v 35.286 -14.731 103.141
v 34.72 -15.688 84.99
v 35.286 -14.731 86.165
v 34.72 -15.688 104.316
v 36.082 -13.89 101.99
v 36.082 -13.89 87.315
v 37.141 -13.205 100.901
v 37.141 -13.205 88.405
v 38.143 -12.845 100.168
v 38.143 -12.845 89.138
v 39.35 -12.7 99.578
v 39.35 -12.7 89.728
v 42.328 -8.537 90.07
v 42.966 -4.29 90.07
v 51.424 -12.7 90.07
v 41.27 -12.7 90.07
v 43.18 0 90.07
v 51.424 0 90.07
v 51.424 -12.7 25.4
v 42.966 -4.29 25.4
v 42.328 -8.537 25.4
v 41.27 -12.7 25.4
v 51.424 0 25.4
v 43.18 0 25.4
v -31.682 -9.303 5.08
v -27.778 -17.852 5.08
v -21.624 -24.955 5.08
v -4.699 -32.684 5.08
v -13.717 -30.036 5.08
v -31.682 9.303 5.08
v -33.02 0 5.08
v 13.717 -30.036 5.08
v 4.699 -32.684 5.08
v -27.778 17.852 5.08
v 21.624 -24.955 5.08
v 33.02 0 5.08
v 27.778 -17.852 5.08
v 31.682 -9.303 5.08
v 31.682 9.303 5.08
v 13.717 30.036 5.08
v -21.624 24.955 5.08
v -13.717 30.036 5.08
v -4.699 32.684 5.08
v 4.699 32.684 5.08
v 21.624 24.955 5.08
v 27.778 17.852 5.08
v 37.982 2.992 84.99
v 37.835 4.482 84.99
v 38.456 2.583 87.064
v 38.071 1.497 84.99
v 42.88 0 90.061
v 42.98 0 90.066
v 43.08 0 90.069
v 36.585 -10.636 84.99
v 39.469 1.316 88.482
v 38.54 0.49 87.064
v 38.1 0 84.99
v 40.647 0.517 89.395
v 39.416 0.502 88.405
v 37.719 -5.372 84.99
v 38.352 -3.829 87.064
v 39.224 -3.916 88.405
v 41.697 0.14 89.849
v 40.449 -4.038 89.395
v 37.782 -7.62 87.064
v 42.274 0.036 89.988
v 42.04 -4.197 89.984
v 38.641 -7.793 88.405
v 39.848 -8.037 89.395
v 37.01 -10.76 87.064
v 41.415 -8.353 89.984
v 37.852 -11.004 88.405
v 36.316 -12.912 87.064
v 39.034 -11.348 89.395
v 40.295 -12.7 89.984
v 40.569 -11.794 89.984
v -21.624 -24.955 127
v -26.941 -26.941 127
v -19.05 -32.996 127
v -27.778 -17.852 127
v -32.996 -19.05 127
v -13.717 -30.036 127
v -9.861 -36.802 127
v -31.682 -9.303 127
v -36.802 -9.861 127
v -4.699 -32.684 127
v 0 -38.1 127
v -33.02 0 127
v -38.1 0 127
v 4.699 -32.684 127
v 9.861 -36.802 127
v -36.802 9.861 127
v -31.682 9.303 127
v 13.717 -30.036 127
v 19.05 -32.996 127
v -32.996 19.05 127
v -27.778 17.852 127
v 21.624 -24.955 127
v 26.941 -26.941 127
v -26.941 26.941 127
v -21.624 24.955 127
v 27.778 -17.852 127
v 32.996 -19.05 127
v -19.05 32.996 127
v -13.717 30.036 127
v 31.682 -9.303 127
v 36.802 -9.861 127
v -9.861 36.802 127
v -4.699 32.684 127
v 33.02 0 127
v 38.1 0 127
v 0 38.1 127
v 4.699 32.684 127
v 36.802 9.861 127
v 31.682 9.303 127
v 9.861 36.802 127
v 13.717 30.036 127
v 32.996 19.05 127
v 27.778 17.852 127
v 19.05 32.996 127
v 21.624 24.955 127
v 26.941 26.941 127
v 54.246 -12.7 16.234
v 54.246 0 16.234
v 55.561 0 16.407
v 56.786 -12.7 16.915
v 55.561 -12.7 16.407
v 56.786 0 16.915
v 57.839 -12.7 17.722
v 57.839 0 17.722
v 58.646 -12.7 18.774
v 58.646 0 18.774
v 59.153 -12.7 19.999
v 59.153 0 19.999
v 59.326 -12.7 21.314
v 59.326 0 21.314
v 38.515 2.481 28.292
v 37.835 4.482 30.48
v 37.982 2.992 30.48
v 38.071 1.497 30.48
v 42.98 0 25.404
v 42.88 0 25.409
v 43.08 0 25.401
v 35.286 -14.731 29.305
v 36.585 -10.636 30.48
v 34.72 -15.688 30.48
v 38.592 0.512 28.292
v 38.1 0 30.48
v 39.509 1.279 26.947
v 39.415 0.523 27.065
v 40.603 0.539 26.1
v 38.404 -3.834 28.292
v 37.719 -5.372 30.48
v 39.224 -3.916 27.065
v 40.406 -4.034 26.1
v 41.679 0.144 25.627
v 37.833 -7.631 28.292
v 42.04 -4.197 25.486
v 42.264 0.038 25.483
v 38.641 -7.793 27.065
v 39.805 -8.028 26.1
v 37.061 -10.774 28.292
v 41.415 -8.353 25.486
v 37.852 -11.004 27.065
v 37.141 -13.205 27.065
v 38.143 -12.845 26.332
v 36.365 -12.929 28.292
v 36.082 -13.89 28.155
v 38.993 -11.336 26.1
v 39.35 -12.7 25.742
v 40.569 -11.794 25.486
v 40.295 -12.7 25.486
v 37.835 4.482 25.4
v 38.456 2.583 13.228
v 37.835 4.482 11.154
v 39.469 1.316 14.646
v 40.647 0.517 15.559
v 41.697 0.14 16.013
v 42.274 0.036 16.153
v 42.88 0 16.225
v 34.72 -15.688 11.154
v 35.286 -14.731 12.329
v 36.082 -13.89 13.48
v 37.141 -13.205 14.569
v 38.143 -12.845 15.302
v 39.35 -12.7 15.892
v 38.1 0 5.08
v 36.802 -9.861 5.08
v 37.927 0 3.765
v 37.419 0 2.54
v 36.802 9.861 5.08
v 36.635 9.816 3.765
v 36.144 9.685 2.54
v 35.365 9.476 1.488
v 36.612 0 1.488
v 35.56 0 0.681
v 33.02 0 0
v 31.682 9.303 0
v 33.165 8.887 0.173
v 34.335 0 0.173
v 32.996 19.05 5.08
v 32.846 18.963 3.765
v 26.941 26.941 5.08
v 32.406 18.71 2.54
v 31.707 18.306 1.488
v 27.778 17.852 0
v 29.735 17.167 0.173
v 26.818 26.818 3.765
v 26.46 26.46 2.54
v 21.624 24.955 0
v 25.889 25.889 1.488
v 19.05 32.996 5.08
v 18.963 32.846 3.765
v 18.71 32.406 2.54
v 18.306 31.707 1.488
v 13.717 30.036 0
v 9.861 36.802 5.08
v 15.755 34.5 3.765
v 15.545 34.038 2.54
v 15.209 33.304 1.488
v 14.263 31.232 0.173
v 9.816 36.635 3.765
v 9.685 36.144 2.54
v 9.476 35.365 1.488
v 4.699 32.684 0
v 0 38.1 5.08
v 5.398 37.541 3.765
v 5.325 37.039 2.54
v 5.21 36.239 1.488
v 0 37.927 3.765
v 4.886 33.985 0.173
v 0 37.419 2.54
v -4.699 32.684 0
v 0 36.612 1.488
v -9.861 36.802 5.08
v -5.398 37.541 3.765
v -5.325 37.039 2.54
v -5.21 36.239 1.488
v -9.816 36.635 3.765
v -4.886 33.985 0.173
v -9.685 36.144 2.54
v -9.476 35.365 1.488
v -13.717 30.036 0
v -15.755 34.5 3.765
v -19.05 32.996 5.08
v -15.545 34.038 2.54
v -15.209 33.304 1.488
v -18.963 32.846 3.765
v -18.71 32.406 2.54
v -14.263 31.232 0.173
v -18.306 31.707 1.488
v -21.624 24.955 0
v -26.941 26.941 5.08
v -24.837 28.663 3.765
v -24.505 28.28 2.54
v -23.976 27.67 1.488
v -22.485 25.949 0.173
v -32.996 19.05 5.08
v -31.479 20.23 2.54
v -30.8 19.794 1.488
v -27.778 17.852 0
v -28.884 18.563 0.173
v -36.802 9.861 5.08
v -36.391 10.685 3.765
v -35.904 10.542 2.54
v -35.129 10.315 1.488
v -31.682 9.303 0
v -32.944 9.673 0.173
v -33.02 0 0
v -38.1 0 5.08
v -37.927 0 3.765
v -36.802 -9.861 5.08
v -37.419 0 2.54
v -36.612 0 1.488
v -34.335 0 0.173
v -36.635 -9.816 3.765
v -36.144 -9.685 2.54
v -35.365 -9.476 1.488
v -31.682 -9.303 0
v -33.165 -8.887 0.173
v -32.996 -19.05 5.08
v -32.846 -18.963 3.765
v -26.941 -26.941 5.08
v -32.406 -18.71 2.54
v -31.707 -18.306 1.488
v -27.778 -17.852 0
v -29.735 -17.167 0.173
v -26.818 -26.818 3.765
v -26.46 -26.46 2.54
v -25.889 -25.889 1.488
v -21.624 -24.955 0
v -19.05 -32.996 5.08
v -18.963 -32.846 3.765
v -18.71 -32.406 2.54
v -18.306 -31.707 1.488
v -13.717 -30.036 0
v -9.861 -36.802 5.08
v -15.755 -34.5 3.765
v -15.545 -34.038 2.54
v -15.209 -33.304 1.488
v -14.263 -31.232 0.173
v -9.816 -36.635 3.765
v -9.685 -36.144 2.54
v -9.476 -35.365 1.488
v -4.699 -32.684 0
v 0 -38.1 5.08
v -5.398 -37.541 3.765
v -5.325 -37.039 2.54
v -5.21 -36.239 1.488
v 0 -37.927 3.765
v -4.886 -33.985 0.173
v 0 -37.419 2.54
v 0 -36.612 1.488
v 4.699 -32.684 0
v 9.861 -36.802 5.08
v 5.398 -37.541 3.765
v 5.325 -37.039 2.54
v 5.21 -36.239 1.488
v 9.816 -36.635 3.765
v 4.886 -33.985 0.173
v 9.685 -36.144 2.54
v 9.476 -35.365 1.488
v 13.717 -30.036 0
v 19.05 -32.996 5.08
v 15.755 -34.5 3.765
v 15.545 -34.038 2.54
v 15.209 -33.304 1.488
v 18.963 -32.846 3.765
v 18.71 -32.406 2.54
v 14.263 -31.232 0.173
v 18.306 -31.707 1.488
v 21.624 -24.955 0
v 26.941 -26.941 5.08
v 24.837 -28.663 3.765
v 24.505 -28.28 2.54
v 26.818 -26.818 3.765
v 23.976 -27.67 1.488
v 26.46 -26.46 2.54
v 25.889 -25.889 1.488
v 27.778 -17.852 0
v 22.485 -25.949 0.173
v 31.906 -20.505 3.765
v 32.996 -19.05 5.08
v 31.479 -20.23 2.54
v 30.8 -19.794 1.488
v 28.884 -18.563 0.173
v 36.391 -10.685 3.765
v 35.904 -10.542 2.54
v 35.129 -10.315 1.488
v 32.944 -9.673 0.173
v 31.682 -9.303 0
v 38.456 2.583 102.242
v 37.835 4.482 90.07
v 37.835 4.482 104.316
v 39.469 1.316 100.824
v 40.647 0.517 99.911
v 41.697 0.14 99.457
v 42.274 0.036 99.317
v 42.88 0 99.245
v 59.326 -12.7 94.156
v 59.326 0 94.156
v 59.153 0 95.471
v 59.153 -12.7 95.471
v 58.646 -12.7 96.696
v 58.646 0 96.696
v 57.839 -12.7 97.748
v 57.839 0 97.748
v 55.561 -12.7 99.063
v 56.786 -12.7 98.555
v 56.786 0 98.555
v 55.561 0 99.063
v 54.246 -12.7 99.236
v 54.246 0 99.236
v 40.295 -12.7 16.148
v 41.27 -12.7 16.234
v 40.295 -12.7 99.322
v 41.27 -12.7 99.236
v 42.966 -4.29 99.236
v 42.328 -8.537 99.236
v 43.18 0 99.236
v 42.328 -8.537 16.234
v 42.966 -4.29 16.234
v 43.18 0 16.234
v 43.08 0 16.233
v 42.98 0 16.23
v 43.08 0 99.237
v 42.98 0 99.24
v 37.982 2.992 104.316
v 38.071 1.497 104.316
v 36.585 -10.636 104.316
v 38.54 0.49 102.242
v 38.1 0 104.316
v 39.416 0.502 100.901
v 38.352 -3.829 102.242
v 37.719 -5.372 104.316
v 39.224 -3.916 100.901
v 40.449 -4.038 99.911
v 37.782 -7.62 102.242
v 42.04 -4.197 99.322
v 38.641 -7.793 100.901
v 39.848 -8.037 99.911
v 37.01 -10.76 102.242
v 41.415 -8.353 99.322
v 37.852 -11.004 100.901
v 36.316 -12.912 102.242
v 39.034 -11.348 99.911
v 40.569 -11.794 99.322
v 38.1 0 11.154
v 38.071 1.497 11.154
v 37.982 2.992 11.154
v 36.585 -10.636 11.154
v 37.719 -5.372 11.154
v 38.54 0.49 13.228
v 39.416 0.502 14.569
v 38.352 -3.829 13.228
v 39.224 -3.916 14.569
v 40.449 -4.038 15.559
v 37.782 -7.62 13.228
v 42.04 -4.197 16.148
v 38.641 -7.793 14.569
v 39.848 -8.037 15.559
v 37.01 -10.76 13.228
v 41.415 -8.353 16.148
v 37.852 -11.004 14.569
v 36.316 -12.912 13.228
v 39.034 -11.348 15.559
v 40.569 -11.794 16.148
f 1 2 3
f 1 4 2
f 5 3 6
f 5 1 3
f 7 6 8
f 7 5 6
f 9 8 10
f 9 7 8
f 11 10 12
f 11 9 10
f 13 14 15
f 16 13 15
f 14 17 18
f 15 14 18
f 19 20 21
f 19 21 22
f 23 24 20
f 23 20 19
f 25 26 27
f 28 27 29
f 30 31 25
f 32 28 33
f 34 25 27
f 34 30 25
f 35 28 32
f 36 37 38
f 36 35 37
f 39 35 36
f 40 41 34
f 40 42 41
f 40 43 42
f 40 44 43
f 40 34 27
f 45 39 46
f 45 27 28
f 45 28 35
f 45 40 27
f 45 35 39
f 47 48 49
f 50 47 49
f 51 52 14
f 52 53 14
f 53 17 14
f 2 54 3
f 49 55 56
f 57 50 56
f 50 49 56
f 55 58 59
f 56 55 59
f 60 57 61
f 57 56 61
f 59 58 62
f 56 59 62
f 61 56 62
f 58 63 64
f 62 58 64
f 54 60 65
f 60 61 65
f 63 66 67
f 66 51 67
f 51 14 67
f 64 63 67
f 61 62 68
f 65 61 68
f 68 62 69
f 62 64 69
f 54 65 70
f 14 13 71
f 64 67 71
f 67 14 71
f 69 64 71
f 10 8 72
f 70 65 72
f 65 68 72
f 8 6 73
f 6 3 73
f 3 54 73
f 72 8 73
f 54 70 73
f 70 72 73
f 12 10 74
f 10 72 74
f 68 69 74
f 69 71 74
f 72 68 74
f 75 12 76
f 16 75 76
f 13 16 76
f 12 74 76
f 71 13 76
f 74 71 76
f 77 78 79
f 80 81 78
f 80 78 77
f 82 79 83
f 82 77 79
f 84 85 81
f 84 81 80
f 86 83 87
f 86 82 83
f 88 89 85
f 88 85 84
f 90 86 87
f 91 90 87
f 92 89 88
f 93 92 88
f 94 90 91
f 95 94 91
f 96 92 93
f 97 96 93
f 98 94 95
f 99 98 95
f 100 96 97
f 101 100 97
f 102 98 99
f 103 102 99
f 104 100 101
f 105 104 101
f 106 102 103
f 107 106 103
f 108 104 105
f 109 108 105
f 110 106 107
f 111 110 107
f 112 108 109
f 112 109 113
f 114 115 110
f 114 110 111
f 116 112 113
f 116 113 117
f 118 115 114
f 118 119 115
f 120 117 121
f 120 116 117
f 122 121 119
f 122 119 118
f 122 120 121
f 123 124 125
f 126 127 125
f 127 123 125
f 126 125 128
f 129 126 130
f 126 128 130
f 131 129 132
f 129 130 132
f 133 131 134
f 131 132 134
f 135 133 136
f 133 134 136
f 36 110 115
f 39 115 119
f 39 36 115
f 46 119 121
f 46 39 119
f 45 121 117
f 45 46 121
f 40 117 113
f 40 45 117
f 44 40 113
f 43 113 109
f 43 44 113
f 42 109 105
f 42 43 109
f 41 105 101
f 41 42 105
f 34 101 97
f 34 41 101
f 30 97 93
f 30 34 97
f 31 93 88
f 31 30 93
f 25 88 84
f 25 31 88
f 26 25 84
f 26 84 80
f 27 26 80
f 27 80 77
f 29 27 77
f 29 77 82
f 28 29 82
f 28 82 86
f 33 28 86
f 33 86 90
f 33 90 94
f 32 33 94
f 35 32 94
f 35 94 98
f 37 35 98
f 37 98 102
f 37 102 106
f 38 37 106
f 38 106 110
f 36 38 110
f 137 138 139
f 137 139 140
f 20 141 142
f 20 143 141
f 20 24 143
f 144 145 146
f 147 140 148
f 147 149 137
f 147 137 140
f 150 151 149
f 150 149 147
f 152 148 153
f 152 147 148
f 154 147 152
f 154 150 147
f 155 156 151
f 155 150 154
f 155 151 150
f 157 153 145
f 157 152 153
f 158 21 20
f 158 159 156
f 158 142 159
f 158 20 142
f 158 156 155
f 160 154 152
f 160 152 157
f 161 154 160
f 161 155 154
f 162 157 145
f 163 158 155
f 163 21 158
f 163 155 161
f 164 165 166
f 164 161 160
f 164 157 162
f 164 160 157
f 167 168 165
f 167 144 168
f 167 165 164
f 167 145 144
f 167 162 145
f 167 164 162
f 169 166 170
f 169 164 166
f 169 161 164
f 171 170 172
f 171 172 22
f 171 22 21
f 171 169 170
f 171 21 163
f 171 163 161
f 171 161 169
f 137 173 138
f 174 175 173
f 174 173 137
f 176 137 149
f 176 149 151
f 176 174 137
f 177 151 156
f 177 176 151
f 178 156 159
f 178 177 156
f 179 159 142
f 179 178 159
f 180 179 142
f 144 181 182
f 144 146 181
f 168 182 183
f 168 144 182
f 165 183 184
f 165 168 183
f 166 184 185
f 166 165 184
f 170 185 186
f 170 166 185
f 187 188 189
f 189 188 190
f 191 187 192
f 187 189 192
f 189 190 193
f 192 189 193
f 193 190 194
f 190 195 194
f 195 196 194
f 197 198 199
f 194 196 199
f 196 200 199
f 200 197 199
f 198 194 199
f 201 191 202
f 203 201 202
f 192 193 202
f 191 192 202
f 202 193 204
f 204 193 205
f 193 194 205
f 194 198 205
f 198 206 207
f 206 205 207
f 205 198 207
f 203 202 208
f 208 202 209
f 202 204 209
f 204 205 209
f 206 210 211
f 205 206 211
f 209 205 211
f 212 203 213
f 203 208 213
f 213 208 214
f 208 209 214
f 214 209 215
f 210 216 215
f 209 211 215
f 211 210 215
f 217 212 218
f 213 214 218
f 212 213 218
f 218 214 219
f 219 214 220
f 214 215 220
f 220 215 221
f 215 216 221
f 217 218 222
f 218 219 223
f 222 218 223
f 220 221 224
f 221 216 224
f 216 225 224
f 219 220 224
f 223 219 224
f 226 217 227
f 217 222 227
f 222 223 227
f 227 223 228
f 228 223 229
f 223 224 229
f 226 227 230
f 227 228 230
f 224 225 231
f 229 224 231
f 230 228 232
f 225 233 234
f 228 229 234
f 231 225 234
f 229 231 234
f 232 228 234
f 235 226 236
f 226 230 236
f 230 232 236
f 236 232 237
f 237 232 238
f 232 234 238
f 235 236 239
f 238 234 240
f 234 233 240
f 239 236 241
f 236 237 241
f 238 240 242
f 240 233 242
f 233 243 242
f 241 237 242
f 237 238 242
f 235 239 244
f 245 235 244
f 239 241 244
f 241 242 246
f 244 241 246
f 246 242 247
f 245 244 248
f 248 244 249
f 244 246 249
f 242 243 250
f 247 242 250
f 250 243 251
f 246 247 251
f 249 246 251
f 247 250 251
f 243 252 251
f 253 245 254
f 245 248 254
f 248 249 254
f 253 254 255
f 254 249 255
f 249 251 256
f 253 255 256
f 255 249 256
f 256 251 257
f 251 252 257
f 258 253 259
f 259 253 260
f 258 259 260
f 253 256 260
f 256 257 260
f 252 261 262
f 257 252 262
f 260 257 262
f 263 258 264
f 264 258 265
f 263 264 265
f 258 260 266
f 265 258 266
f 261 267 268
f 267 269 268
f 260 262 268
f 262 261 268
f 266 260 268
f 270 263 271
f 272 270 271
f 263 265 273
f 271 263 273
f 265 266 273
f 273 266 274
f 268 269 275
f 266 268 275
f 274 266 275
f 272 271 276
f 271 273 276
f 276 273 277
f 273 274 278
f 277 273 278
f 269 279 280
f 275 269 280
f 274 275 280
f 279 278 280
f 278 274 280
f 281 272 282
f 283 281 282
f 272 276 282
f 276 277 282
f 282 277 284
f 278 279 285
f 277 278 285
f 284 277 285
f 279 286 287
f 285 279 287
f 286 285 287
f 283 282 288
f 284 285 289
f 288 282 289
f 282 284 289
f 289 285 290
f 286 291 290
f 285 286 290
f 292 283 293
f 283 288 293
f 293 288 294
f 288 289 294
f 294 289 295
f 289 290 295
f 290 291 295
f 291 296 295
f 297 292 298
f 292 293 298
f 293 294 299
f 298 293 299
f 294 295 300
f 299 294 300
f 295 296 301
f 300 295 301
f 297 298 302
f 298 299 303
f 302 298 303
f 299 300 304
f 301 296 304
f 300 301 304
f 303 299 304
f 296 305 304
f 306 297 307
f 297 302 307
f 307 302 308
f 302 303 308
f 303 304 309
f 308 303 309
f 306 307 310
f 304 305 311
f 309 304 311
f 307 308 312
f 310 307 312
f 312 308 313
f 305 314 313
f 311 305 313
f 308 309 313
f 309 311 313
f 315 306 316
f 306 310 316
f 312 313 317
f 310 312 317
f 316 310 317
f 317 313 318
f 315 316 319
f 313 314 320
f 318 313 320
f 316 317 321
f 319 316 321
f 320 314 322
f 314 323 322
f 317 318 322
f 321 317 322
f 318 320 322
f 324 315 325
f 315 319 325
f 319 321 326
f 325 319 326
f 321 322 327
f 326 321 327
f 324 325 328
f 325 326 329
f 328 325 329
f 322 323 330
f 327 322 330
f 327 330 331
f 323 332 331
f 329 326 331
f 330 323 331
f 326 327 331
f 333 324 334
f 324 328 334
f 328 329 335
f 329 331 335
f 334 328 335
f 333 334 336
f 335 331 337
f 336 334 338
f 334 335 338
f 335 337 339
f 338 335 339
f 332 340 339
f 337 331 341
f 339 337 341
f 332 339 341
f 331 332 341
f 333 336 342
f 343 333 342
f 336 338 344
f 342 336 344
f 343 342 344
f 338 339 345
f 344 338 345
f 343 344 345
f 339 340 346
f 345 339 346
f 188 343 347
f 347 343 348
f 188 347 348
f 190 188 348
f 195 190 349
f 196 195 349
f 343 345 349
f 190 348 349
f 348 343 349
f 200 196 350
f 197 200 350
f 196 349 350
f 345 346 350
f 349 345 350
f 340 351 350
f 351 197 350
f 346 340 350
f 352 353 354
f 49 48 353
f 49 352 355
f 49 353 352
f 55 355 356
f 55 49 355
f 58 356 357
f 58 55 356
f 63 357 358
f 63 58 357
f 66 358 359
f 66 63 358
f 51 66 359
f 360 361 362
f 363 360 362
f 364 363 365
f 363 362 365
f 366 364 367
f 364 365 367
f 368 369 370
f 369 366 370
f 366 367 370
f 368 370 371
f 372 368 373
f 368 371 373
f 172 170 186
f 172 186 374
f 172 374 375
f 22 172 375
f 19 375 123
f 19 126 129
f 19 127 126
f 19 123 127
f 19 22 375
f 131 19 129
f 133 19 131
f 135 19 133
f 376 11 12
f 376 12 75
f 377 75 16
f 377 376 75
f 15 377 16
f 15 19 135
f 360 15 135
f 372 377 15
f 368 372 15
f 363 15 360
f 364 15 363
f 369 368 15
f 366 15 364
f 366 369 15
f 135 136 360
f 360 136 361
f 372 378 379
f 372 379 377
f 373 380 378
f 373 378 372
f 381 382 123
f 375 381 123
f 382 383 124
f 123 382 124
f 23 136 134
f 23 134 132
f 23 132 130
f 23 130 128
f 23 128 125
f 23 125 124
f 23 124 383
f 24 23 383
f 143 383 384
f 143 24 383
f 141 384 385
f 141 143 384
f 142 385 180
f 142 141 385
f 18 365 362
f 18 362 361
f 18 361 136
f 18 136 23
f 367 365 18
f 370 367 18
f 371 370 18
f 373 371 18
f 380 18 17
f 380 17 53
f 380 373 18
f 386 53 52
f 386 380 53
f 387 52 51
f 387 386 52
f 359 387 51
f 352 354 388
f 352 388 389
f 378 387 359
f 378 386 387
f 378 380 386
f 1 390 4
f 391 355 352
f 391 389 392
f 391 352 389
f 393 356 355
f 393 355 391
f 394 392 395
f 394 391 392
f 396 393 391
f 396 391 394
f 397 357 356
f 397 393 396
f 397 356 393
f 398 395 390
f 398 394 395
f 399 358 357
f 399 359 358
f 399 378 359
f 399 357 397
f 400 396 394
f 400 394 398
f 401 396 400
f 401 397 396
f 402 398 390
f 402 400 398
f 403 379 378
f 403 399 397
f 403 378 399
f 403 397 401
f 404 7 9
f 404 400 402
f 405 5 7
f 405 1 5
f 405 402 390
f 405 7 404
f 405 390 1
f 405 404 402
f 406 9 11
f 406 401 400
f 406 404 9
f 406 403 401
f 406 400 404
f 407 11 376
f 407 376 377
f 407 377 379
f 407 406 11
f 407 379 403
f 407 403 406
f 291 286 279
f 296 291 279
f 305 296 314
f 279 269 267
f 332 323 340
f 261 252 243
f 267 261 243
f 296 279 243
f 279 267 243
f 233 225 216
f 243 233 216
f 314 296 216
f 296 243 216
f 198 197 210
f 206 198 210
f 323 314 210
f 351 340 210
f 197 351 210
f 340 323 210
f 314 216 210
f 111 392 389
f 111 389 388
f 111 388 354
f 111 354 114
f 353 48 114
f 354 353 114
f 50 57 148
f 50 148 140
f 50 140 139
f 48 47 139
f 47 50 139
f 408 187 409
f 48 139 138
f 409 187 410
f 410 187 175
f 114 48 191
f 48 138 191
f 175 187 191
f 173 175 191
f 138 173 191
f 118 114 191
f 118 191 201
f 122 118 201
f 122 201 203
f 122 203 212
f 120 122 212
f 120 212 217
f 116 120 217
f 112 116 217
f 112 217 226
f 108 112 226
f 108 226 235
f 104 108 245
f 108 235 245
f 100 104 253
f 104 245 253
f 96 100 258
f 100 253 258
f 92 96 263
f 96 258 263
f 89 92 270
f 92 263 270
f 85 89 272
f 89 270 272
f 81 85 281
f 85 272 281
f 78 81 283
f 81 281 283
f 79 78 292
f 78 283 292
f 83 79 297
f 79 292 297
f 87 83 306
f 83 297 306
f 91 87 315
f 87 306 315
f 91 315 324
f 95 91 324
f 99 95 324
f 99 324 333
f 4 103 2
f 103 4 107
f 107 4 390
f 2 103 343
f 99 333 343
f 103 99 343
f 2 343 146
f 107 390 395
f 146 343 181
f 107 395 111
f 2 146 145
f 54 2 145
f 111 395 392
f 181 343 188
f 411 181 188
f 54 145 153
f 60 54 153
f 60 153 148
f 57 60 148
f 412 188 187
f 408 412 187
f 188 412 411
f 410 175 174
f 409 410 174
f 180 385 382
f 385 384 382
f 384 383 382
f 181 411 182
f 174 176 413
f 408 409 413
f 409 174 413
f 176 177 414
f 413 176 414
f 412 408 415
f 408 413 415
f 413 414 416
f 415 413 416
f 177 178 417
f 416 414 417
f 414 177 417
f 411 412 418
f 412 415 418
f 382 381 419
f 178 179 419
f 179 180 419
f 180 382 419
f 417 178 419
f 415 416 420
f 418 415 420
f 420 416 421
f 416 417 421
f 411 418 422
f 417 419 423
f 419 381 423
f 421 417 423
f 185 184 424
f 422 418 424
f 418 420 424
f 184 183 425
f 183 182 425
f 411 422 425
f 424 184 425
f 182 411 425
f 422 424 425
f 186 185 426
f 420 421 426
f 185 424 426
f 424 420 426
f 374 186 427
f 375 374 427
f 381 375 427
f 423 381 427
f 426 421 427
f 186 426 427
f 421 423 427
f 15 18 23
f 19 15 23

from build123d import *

# Parameters (mm, degrees)
F0_R          = 38.1
F1_DEPTH      = 127
F2_T          = -5.08
F4_DEPTH      = 12.7
F5_T1_DEPTH   = 9.165816009
F5_T3_DEPTH   = 9.165816009
F5_T8_ANGLE   = 38.5701728076
F5_T13_ANGLE  = 38.5701728076
F5_T18_ANGLE  = 38.5701728076
F5_T23_ANGLE  = 38.5701728076
F5_T29_DEPTH  = 17.737031792
F5_T33_ANGLE  = 38.5701728076
F5_T40_ANGLE  = 38.5701728076
F5_T44_DEPTH  = 17.737031792
F5_T51_DEPTH  = 17.737031792
F5_T55_ANGLE  = 38.5701728076
F5_T62_ANGLE  = 38.5701728076
F5_T66_DEPTH  = 17.737031792
F5_T73_ANGLE  = 57.6691249807
F5_T77_DEPTH  = 21.1161541615
F5_T84_ANGLE  = 57.6691249807
F5_T88_DEPTH  = 21.1161541615
F5_T95_ANGLE  = 57.6691249807
F5_T99_DEPTH  = 21.1161541615
F5_T106_ANGLE = 57.6691249807
F5_T110_DEPTH = 21.1161541615
F5_T113_DEPTH = 38.1


# Not quite as in the source:
# - a fillet or chamfer that OpenCascade refuses, or shapes differently, is made with other operations: its cross-section is extruded or revolved along the edge and cut away or added


with BuildPart() as f1:
    # F0 (on Top) → F1 (new body)
    with BuildSketch(Plane.XY):
        Circle(F0_R)
    extrude(amount=F1_DEPTH)

    # F2
    f2_openings = [f1.faces().sort_by_distance(p)[0] for p in [
        (0, 0, 127),
    ]]
    offset(amount=F2_T, openings=f2_openings)

    # F3 (on Front) → F4 (join)
    with BuildSketch(Plane.XZ):
        Polygon((59.3263991177, 99.2357954383), (35.6448739767, 99.2357954383), (35.6448739767, 90.0699794292), (51.4244176447, 90.0699794292), (51.4244176447, 25.3999941051), (35.6448739767, 25.3999941051), (35.6448739767, 16.2341780961), (59.3263991177, 16.2341780961), align=None)
    extrude(amount=F4_DEPTH)

    # F5: fillet of radius 5.08 on 11 edges, made by hand

    # F5_s2 → F5_t1 (join)
    with BuildSketch(Plane.XY.offset(16.2341780961)):
        with BuildLine():
            ThreePointArc((34.720156586, -15.6882352941), (36.5944939832, -13.5119463039), (39.3495107975, -12.7))
            Line((39.3495107975, -12.7), (35.9210244843, -12.7))
            ThreePointArc((35.9210244843, -12.7), (35.3521781973, -14.2068116305), (34.720156586, -15.6882352941))
        make_face()
        with BuildLine():
            ThreePointArc((37.8354134656, 4.4823529412), (39.5059425471, 1.2824713919), (42.880135261, 0))
            Line((42.880135261, 0), (38.1, 0))
            ThreePointArc((38.1, 0), (38.0337958468, 2.2450776113), (37.8354134656, 4.4823529412))
        make_face()
    extrude(amount=F5_T1_DEPTH)

    # F5_s4 → F5_t3 (join)
    with BuildSketch(Plane.XY.offset(90.0699794292)):
        with BuildLine():
            ThreePointArc((34.720156586, -15.6882352941), (36.5944939832, -13.5119463039), (39.3495107975, -12.7))
            Line((39.3495107975, -12.7), (35.9210244843, -12.7))
            ThreePointArc((35.9210244843, -12.7), (35.3521781973, -14.2068116305), (34.720156586, -15.6882352941))
        make_face()
        with BuildLine():
            ThreePointArc((37.8354134656, 4.4823529412), (39.5059425471, 1.2824713919), (42.880135261, 0))
            Line((42.880135261, 0), (38.1, 0))
            ThreePointArc((38.1, 0), (38.0337958468, 2.2450776113), (37.8354134656, 4.4823529412))
        make_face()
    extrude(amount=F5_T3_DEPTH)


with BuildPart() as f5_tool6:
    # F5_s7 → F5_t8 (revolve)
    with BuildSketch(Plane.XZ):
        with BuildLine():
            ThreePointArc((38.1, 104.3157954383), (39.5878975516, 100.7236929899), (43.18, 99.2357954383))
            Line((43.18, 99.2357954383), (38.1, 99.2357954383))
            Line((38.1, 99.2357954383), (38.1, 104.3157954383))
        make_face()
    revolve(axis=Axis((0, 0, 99.2357954383), (0, 0, -1)), revolution_arc=F5_T8_ANGLE)

    split(bisect_by=Plane.XZ.offset(12.7), keep=Keep.BOTTOM)


with BuildPart() as f1_1:
    add(f1.part)

    # F5_t5: union F5_tool6
    add(f5_tool6.part)


with BuildPart() as f5_tool11:
    # F5_s12 → F5_t13 (revolve)
    with BuildSketch(Plane.XZ):
        with BuildLine():
            ThreePointArc((38.1, 84.9899794292), (39.5878975516, 88.5820818777), (43.18, 90.0699794292))
            Line((43.18, 90.0699794292), (38.1, 90.0699794292))
            Line((38.1, 90.0699794292), (38.1, 84.9899794292))
        make_face()
    revolve(axis=Axis((0, 0, 90.0699794292), (0, 0, -1)), revolution_arc=F5_T13_ANGLE)

    split(bisect_by=Plane.XZ.offset(12.7), keep=Keep.BOTTOM)


with BuildPart() as f1_2:
    add(f1_1.part)

    # F5_t10: union F5_tool11
    add(f5_tool11.part)


with BuildPart() as f5_tool16:
    # F5_s17 → F5_t18 (revolve)
    with BuildSketch(Plane.XZ):
        with BuildLine():
            ThreePointArc((38.1, 11.1541780961), (39.5878975516, 14.7462805445), (43.18, 16.2341780961))
            Line((43.18, 16.2341780961), (38.1, 16.2341780961))
            Line((38.1, 16.2341780961), (38.1, 11.1541780961))
        make_face()
    revolve(axis=Axis((0, 0, 16.2341780961), (0, 0, -1)), revolution_arc=F5_T18_ANGLE)

    split(bisect_by=Plane.XZ.offset(12.7), keep=Keep.BOTTOM)


with BuildPart() as f1_3:
    add(f1_2.part)

    # F5_t15: union F5_tool16
    add(f5_tool16.part)


with BuildPart() as f5_tool21:
    # F5_s22 → F5_t23 (revolve)
    with BuildSketch(Plane.XZ):
        with BuildLine():
            ThreePointArc((38.1, 30.4799941051), (39.5878975516, 26.8878916567), (43.18, 25.3999941051))
            Line((43.18, 25.3999941051), (38.1, 25.3999941051))
            Line((38.1, 25.3999941051), (38.1, 30.4799941051))
        make_face()
    revolve(axis=Axis((0, 0, 25.3999941051), (0, 0, -1)), revolution_arc=F5_T23_ANGLE)

    split(bisect_by=Plane.XZ.offset(12.7), keep=Keep.BOTTOM)


with BuildPart() as f1_4:
    add(f1_3.part)

    # F5_t20: union F5_tool21
    add(f5_tool21.part)


with BuildPart() as f5_tool27:
    # F5_s28 → F5_t29 (new body)
    with BuildSketch(Plane.XY.offset(33.9712098881)):
        with BuildLine():
            ThreePointArc((34.720156586, -15.6882352941), (36.5944939832, -13.5119463039), (39.3495107975, -12.7))
            Line((39.3495107975, -12.7), (35.9210244843, -12.7))
            ThreePointArc((35.9210244843, -12.7), (35.3521781973, -14.2068116305), (34.720156586, -15.6882352941))
        make_face()
    extrude(amount=-F5_T29_DEPTH)

    split(bisect_by=Plane.XY.offset(25.3999941051), keep=Keep.TOP)


with BuildPart() as f5_tool31:
    # F5_s32 → F5_t33 (revolve)
    with BuildSketch(Plane.XZ):
        with BuildLine():
            ThreePointArc((38.1, 30.4799941051), (39.5878975516, 26.8878916567), (43.18, 25.3999941051))
            Line((43.18, 25.3999941051), (38.1, 25.3999941051))
            Line((38.1, 25.3999941051), (38.1, 30.4799941051))
        make_face()
    revolve(axis=Axis((0, 0, 25.3999941051), (0, 0, -1)), revolution_arc=F5_T33_ANGLE)

    split(bisect_by=Plane.XZ.offset(12.7), keep=Keep.TOP)


with BuildPart() as f5_tool27_1:
    add(f5_tool27.part)

    # F5_t35: intersect F5_tool31
    add(f5_tool31.part, mode=Mode.INTERSECT)


with BuildPart() as f1_5:
    add(f1_4.part)

    # F5_t25: union F5_tool27
    add(f5_tool27_1.part)


with BuildPart() as f5_tool38:
    # F5_s39 → F5_t40 (revolve)
    with BuildSketch(Plane.XZ):
        with BuildLine():
            ThreePointArc((38.1, 11.1541780961), (39.5878975516, 14.7462805445), (43.18, 16.2341780961))
            Line((43.18, 16.2341780961), (38.1, 16.2341780961))
            Line((38.1, 16.2341780961), (38.1, 11.1541780961))
        make_face()
    revolve(axis=Axis((0, 0, 16.2341780961), (0, 0, -1)), revolution_arc=F5_T40_ANGLE)

    split(bisect_by=Plane.XZ.offset(12.7), keep=Keep.TOP)


with BuildPart() as f5_tool42:
    # F5_s43 → F5_t44 (new body)
    with BuildSketch(Plane.XY.offset(25.3999941051)):
        with BuildLine():
            ThreePointArc((34.720156586, -15.6882352941), (36.5944939832, -13.5119463039), (39.3495107975, -12.7))
            Line((39.3495107975, -12.7), (35.9210244843, -12.7))
            ThreePointArc((35.9210244843, -12.7), (35.3521781973, -14.2068116305), (34.720156586, -15.6882352941))
        make_face()
    extrude(amount=-F5_T44_DEPTH)

    split(bisect_by=Plane.XY.offset(16.2341780961), keep=Keep.BOTTOM)


with BuildPart() as f5_tool38_1:
    add(f5_tool38.part)

    # F5_t46: intersect F5_tool42
    add(f5_tool42.part, mode=Mode.INTERSECT)


with BuildPart() as f1_6:
    add(f1_5.part)

    # F5_t36: union F5_tool38
    add(f5_tool38_1.part)


with BuildPart() as f5_tool49:
    # F5_s50 → F5_t51 (new body)
    with BuildSketch(Plane.XY.offset(107.8070112213)):
        with BuildLine():
            ThreePointArc((34.720156586, -15.6882352941), (36.5944939832, -13.5119463039), (39.3495107975, -12.7))
            Line((39.3495107975, -12.7), (35.9210244843, -12.7))
            ThreePointArc((35.9210244843, -12.7), (35.3521781973, -14.2068116305), (34.720156586, -15.6882352941))
        make_face()
    extrude(amount=-F5_T51_DEPTH)

    split(bisect_by=Plane.XY.offset(99.2357954383), keep=Keep.TOP)


with BuildPart() as f5_tool53:
    # F5_s54 → F5_t55 (revolve)
    with BuildSketch(Plane.XZ):
        with BuildLine():
            ThreePointArc((38.1, 104.3157954383), (39.5878975516, 100.7236929899), (43.18, 99.2357954383))
            Line((43.18, 99.2357954383), (38.1, 99.2357954383))
            Line((38.1, 99.2357954383), (38.1, 104.3157954383))
        make_face()
    revolve(axis=Axis((0, 0, 99.2357954383), (0, 0, -1)), revolution_arc=F5_T55_ANGLE)

    split(bisect_by=Plane.XZ.offset(12.7), keep=Keep.TOP)


with BuildPart() as f5_tool49_1:
    add(f5_tool49.part)

    # F5_t57: intersect F5_tool53
    add(f5_tool53.part, mode=Mode.INTERSECT)


with BuildPart() as f1_7:
    add(f1_6.part)

    # F5_t47: union F5_tool49
    add(f5_tool49_1.part)


with BuildPart() as f5_tool60:
    # F5_s61 → F5_t62 (revolve)
    with BuildSketch(Plane.XZ):
        with BuildLine():
            ThreePointArc((38.1, 84.9899794292), (39.5878975516, 88.5820818777), (43.18, 90.0699794292))
            Line((43.18, 90.0699794292), (38.1, 90.0699794292))
            Line((38.1, 90.0699794292), (38.1, 84.9899794292))
        make_face()
    revolve(axis=Axis((0, 0, 90.0699794292), (0, 0, -1)), revolution_arc=F5_T62_ANGLE)

    split(bisect_by=Plane.XZ.offset(12.7), keep=Keep.TOP)


with BuildPart() as f5_tool64:
    # F5_s65 → F5_t66 (new body)
    with BuildSketch(Plane.XY.offset(99.2357954383)):
        with BuildLine():
            ThreePointArc((34.720156586, -15.6882352941), (36.5944939832, -13.5119463039), (39.3495107975, -12.7))
            Line((39.3495107975, -12.7), (35.9210244843, -12.7))
            ThreePointArc((35.9210244843, -12.7), (35.3521781973, -14.2068116305), (34.720156586, -15.6882352941))
        make_face()
    extrude(amount=-F5_T66_DEPTH)

    split(bisect_by=Plane.XY.offset(90.0699794292), keep=Keep.BOTTOM)


with BuildPart() as f5_tool60_1:
    add(f5_tool60.part)

    # F5_t68: intersect F5_tool64
    add(f5_tool64.part, mode=Mode.INTERSECT)


with BuildPart() as f1_8:
    add(f1_7.part)

    # F5_t58: union F5_tool60
    add(f5_tool60_1.part)


with BuildPart() as f5_tool71:
    # F5_s72 → F5_t73 (revolve)
    with BuildSketch(Plane(origin=(0, 0, 0), x_dir=(0, 0, 1), z_dir=(-0.3272006177, 0.9449548962, 0))):
        with BuildLine():
            ThreePointArc((104.3157954383, 38.1), (100.7236929899, 39.5878975516), (99.2357954383, 43.18))
            Line((99.2357954383, 43.18), (99.2357954383, 38.1))
            Line((99.2357954383, 38.1), (104.3157954383, 38.1))
        make_face()
    revolve(axis=Axis((0, 0, 99.2357954383), (0, 0, -1)), revolution_arc=F5_T73_ANGLE)

    split(bisect_by=Plane.XZ, keep=Keep.BOTTOM)


with BuildPart() as f5_tool75:
    # F5_s76 → F5_t77 (new body)
    with BuildSketch(Plane.XY.offset(90.0699794292)):
        with BuildLine():
            ThreePointArc((37.8354134656, 4.4823529412), (39.5059425471, 1.2824713919), (42.880135261, 0))
            Line((42.880135261, 0), (38.1, 0))
            ThreePointArc((38.1, 0), (38.0337958468, 2.2450776113), (37.8354134656, 4.4823529412))
        make_face()
    extrude(amount=F5_T77_DEPTH)

    split(bisect_by=Plane.XY.offset(99.2357954383), keep=Keep.TOP)


with BuildPart() as f5_tool71_1:
    add(f5_tool71.part)

    # F5_t79: intersect F5_tool75
    add(f5_tool75.part, mode=Mode.INTERSECT)


with BuildPart() as f1_9:
    add(f1_8.part)

    # F5_t69: union F5_tool71
    add(f5_tool71_1.part)


with BuildPart() as f5_tool82:
    # F5_s83 → F5_t84 (revolve)
    with BuildSketch(Plane(origin=(0, 0, 0), x_dir=(0, 0, 1), z_dir=(-0.3272006177, 0.9449548962, 0))):
        with BuildLine():
            ThreePointArc((84.9899794292, 38.1), (88.5820818777, 39.5878975516), (90.0699794292, 43.18))
            Line((90.0699794292, 43.18), (90.0699794292, 38.1))
            Line((90.0699794292, 38.1), (84.9899794292, 38.1))
        make_face()
    revolve(axis=Axis((0, 0, 90.0699794292), (0, 0, -1)), revolution_arc=F5_T84_ANGLE)

    split(bisect_by=Plane.XZ, keep=Keep.BOTTOM)


with BuildPart() as f5_tool86:
    # F5_s87 → F5_t88 (new body)
    with BuildSketch(Plane.XY.offset(78.1196412768)):
        with BuildLine():
            ThreePointArc((37.8354134656, 4.4823529412), (39.5059425471, 1.2824713919), (42.880135261, 0))
            Line((42.880135261, 0), (38.1, 0))
            ThreePointArc((38.1, 0), (38.0337958468, 2.2450776113), (37.8354134656, 4.4823529412))
        make_face()
    extrude(amount=F5_T88_DEPTH)

    split(bisect_by=Plane.XY.offset(90.0699794292), keep=Keep.BOTTOM)


with BuildPart() as f5_tool82_1:
    add(f5_tool82.part)

    # F5_t90: intersect F5_tool86
    add(f5_tool86.part, mode=Mode.INTERSECT)


with BuildPart() as f1_10:
    add(f1_9.part)

    # F5_t80: union F5_tool82
    add(f5_tool82_1.part)


with BuildPart() as f5_tool93:
    # F5_s94 → F5_t95 (revolve)
    with BuildSketch(Plane(origin=(0, 0, 0), x_dir=(0, 0, 1), z_dir=(-0.3272006177, 0.9449548962, 0))):
        with BuildLine():
            ThreePointArc((11.1541780961, 38.1), (14.7462805445, 39.5878975516), (16.2341780961, 43.18))
            Line((16.2341780961, 43.18), (16.2341780961, 38.1))
            Line((16.2341780961, 38.1), (11.1541780961, 38.1))
        make_face()
    revolve(axis=Axis((0, 0, 16.2341780961), (0, 0, -1)), revolution_arc=F5_T95_ANGLE)

    split(bisect_by=Plane.XZ, keep=Keep.BOTTOM)


with BuildPart() as f5_tool97:
    # F5_s98 → F5_t99 (new body)
    with BuildSketch(Plane.XY.offset(4.2838399436)):
        with BuildLine():
            ThreePointArc((37.8354134656, 4.4823529412), (39.5059425471, 1.2824713919), (42.880135261, 0))
            Line((42.880135261, 0), (38.1, 0))
            ThreePointArc((38.1, 0), (38.0337958468, 2.2450776113), (37.8354134656, 4.4823529412))
        make_face()
    extrude(amount=F5_T99_DEPTH)

    split(bisect_by=Plane.XY.offset(16.2341780961), keep=Keep.BOTTOM)


with BuildPart() as f5_tool93_1:
    add(f5_tool93.part)

    # F5_t101: intersect F5_tool97
    add(f5_tool97.part, mode=Mode.INTERSECT)


with BuildPart() as f1_11:
    add(f1_10.part)

    # F5_t91: union F5_tool93
    add(f5_tool93_1.part)


with BuildPart() as f5_tool104:
    # F5_s105 → F5_t106 (revolve)
    with BuildSketch(Plane(origin=(0, 0, 0), x_dir=(0, 0, 1), z_dir=(-0.3272006177, 0.9449548962, 0))):
        with BuildLine():
            ThreePointArc((30.4799941051, 38.1), (26.8878916567, 39.5878975516), (25.3999941051, 43.18))
            Line((25.3999941051, 43.18), (25.3999941051, 38.1))
            Line((25.3999941051, 38.1), (30.4799941051, 38.1))
        make_face()
    revolve(axis=Axis((0, 0, 25.3999941051), (0, 0, -1)), revolution_arc=F5_T106_ANGLE)

    split(bisect_by=Plane.XZ, keep=Keep.BOTTOM)


with BuildPart() as f5_tool108:
    # F5_s109 → F5_t110 (new body)
    with BuildSketch(Plane.XY.offset(16.2341780961)):
        with BuildLine():
            ThreePointArc((37.8354134656, 4.4823529412), (39.5059425471, 1.2824713919), (42.880135261, 0))
            Line((42.880135261, 0), (38.1, 0))
            ThreePointArc((38.1, 0), (38.0337958468, 2.2450776113), (37.8354134656, 4.4823529412))
        make_face()
    extrude(amount=F5_T110_DEPTH)

    split(bisect_by=Plane.XY.offset(25.3999941051), keep=Keep.TOP)


with BuildPart() as f5_tool104_1:
    add(f5_tool104.part)

    # F5_t112: intersect F5_tool108
    add(f5_tool108.part, mode=Mode.INTERSECT)


with BuildPart() as f1_12:
    add(f1_11.part)

    # F5_t102: union F5_tool104
    add(f5_tool104_1.part)

    # F5_s114 → F5_t113 (cut)
    with BuildSketch(Plane.XZ.offset(-12.7)):
        with BuildLine():
            ThreePointArc((59.3263991177, 94.1557954383), (57.8385015661, 97.7478978867), (54.2463991177, 99.2357954383))
            Line((54.2463991177, 99.2357954383), (59.3263991177, 99.2357954383))
            Line((59.3263991177, 99.2357954383), (59.3263991177, 94.1557954383))
        make_face()
        with BuildLine():
            ThreePointArc((54.2463991177, 16.2341780961), (57.8385015661, 17.7220756476), (59.3263991177, 21.3141780961))
            Line((59.3263991177, 21.3141780961), (59.3263991177, 16.2341780961))
            Line((59.3263991177, 16.2341780961), (54.2463991177, 16.2341780961))
        make_face()
    extrude(amount=F5_T113_DEPTH, mode=Mode.SUBTRACT)

    # F5_s115 → F5_t116 (revolve, cut)
    with BuildSketch(Plane.XZ):
        with BuildLine():
            ThreePointArc((38.1, 5.08), (36.6121024484, 1.4878975516), (33.02, 0))
            Line((33.02, 0), (38.1, 0))
            Line((38.1, 0), (38.1, 5.08))
        make_face()
    revolve(axis=Axis((0, 0, 0), (0, 0, 1)), mode=Mode.SUBTRACT)


solid = f1_12.part
